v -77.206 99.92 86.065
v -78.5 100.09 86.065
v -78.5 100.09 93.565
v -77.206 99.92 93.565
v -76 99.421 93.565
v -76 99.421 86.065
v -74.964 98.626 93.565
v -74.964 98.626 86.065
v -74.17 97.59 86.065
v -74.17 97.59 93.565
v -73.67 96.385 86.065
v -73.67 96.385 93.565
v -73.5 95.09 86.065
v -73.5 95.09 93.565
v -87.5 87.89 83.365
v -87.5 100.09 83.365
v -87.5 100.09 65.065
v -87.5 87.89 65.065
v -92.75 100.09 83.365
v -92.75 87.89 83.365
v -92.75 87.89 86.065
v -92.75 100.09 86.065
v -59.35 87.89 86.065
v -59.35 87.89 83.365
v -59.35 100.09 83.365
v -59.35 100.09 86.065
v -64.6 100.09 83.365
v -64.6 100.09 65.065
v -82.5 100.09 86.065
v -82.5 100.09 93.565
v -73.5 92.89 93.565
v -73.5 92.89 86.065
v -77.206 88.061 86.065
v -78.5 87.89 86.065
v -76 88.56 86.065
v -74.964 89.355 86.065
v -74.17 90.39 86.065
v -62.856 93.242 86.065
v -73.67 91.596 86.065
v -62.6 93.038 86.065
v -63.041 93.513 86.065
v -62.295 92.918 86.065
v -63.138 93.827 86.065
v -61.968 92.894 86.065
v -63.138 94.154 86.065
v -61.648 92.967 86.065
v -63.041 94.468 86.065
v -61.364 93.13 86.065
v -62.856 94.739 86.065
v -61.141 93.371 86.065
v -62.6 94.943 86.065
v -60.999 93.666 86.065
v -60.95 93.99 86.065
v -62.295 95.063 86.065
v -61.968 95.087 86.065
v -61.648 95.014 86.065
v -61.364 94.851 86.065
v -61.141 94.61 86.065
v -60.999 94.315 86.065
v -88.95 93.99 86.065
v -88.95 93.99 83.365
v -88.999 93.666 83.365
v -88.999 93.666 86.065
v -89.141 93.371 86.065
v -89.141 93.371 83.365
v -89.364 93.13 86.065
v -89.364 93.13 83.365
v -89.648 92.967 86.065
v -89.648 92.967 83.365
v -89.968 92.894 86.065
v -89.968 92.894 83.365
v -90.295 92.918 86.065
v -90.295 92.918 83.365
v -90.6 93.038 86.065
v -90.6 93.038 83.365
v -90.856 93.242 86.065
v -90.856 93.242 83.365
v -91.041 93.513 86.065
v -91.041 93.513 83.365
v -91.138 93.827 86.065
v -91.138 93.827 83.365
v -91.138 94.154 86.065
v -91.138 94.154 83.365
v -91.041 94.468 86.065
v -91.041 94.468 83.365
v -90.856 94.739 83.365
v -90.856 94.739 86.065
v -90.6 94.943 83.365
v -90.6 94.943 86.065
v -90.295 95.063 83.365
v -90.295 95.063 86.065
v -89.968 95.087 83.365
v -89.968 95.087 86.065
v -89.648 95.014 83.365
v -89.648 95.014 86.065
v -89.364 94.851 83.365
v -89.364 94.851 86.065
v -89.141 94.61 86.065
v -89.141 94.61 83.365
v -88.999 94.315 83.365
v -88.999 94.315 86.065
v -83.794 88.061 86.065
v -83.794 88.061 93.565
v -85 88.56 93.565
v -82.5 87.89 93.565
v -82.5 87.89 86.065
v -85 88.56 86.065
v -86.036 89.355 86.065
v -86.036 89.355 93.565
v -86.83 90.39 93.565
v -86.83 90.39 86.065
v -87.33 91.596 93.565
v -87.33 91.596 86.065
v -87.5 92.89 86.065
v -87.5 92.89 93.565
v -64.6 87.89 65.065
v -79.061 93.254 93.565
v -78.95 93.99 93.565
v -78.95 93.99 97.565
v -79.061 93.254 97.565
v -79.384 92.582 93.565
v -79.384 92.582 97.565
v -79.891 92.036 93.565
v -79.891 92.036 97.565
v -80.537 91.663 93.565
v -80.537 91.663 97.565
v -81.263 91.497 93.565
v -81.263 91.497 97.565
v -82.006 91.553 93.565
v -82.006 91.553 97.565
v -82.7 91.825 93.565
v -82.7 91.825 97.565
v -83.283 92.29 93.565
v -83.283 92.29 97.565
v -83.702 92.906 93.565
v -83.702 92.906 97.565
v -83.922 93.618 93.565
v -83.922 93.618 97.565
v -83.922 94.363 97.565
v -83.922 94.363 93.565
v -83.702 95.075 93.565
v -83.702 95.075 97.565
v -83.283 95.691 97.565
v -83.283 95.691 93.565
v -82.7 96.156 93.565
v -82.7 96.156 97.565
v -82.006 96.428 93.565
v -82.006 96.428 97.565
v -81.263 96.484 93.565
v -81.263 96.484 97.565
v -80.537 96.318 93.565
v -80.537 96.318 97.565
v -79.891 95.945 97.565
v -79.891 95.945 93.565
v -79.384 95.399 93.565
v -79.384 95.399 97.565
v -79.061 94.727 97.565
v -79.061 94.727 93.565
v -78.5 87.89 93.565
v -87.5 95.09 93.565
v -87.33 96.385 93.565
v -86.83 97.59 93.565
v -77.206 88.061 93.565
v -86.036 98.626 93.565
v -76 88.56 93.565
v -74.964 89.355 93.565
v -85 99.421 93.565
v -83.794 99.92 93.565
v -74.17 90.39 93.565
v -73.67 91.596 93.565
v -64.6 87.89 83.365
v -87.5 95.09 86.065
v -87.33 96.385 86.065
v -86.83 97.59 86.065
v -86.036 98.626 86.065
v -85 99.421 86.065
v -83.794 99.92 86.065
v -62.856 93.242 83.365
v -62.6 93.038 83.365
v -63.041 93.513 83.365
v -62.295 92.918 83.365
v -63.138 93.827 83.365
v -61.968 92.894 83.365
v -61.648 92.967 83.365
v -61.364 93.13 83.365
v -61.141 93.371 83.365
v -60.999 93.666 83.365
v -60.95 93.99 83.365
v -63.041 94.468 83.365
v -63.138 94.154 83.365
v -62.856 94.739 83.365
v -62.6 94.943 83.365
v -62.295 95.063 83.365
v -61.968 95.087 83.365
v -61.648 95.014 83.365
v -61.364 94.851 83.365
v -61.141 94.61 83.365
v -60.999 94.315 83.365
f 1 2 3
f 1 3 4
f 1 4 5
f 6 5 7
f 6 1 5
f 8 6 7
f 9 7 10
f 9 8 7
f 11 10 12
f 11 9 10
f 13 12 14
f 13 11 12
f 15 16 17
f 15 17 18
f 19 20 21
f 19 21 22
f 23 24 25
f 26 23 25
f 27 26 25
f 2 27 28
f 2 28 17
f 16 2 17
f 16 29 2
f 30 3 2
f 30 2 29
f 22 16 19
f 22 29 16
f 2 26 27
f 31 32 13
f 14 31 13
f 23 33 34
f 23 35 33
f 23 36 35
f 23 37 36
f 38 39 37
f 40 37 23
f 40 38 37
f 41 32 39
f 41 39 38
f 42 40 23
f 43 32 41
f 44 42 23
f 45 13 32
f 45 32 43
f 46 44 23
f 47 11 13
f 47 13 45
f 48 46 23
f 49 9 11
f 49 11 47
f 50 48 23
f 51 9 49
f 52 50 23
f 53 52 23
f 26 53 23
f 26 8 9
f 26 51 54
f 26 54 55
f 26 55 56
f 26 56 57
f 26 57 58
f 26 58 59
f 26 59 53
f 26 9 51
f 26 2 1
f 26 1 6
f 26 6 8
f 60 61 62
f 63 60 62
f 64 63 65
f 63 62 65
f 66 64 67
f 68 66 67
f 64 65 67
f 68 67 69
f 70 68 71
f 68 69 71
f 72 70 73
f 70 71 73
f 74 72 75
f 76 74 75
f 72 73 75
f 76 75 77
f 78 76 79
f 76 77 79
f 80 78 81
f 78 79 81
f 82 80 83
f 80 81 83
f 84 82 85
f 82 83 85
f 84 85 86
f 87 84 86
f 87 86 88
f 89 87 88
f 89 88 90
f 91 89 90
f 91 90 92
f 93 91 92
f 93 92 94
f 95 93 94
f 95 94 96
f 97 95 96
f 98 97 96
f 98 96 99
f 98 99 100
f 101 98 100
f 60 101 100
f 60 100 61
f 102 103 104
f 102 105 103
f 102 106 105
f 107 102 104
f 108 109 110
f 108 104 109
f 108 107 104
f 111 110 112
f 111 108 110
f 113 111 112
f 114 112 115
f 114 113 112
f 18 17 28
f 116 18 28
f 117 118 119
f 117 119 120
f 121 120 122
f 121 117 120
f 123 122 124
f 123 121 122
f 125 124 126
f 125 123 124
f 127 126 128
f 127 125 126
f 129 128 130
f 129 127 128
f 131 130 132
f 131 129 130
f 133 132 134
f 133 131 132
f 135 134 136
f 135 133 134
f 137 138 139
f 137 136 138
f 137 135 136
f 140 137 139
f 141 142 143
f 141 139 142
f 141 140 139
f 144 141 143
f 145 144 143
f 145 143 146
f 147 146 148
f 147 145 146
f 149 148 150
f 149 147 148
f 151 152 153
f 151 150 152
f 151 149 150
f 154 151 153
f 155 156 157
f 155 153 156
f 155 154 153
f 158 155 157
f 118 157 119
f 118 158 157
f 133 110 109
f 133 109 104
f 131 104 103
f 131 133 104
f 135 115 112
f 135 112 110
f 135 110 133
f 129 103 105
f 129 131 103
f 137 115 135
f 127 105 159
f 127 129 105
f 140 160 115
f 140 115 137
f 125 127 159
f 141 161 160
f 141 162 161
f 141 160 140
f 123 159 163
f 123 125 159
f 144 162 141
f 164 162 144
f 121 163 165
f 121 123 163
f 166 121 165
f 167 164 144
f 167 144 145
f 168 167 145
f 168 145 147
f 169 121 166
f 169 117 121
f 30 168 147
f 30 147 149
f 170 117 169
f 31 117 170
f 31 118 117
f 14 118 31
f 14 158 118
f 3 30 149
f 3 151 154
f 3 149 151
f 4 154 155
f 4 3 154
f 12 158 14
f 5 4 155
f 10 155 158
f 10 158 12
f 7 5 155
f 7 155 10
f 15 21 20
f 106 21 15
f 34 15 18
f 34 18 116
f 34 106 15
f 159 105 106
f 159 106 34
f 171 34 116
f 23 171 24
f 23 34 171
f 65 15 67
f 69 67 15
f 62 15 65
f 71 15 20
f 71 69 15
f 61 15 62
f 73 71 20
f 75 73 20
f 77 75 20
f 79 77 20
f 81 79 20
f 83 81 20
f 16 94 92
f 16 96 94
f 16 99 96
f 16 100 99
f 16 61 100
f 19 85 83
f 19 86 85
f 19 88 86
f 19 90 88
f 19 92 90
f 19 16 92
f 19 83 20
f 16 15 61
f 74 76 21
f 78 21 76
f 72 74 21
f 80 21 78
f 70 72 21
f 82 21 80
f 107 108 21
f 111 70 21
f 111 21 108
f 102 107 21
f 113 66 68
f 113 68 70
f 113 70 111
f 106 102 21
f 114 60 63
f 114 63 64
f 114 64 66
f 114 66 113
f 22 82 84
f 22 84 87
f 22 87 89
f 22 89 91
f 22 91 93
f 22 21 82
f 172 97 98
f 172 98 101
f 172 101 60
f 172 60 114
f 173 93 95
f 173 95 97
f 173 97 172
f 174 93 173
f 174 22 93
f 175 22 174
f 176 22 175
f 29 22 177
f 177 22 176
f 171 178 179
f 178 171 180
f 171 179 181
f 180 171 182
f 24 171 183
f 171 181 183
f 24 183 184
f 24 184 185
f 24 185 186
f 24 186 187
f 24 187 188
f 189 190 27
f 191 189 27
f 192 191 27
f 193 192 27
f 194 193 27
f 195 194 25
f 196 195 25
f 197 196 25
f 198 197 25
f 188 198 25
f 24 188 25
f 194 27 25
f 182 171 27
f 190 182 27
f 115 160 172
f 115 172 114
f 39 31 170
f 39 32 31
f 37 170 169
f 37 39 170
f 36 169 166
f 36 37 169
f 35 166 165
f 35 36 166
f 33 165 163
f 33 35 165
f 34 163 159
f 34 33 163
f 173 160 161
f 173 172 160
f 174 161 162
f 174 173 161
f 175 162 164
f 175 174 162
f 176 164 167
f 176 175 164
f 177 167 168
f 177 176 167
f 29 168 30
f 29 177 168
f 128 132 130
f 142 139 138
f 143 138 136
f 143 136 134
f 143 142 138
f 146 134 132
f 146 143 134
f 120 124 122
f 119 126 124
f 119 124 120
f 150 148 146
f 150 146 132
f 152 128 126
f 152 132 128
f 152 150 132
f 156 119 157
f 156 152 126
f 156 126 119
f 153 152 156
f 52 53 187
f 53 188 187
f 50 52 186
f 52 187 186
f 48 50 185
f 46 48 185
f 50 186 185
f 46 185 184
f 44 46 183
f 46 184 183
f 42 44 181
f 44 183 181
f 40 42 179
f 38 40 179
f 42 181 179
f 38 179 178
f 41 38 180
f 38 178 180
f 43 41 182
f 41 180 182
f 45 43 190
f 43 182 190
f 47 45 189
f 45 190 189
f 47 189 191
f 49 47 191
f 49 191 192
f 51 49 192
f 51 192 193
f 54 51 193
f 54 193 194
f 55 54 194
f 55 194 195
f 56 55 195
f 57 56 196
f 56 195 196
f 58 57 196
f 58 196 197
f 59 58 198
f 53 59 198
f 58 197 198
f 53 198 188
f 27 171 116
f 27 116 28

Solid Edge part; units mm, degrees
sketch "Sketch1" plane through (0, 0, 86.0654) normal (0, 0, 1) x (1, 0, 0)
  line L0 (-64.6, 87.8905) -> (-64.6, 100.0905)
  line L1 (-64.6, 100.0905) -> (-87.5, 100.0905)
  line L2 (-87.5, 100.0905) -> (-87.5, 87.8905)
  line L3 (-87.5, 87.8905) -> (-64.6, 87.8905)
extrude "Protrusion1" add sketch "Sketch1" against normal blind 21
sketch "Sketch2" plane through (-76.05, 93.9905, 86.0654) normal (0, 0, 1) x (1, 0, 0)
  line L0 (2.55, -1.1) -> (2.55, 1.1)
  arc A0 (-2.45, 6.1) -> (2.55, 1.1) centre (-2.45, 1.1) cw
  line L1 (-2.45, 6.1) -> (-6.45, 6.1)
  arc A1 (-11.45, 1.1) -> (-6.45, 6.1) centre (-6.45, 1.1) cw
  line L2 (-11.45, 1.1) -> (-11.45, -1.1)
  arc A2 (-11.45, -1.1) -> (-6.45, -6.1) centre (-6.45, -1.1) ccw
  line L3 (-6.45, -6.1) -> (-2.45, -6.1)
  arc A3 (-2.45, -6.1) -> (2.55, -1.1) centre (-2.45, -1.1) ccw
extrude "ExtrudedProtrusion_5" add sketch "Sketch2" along normal blind 7.5
sketch "Sketch3" plane through (-80.5, 93.9905, 93.5654) normal (0, 0, 1) x (1, 0, 0)
  circle A0 centre (-0.95, 0) radius 2.5
extrude "ExtrudedProtrusion_6" add sketch "Sketch3" along normal blind 4
sketch "Sketch4" plane through (-76.05, 93.9905, 83.3654) normal (0, 0, -1) x (1, 0, 0)
  line L0 (-16.7, -6.1) -> (-11.45, -6.1)
  line L1 (-11.45, -6.1) -> (-11.45, 6.1)
  line L2 (-11.45, 6.1) -> (-16.7, 6.1)
  line L3 (-16.7, 6.1) -> (-16.7, -6.1)
  circle A0 centre (-14, 0) radius 1.1
  line L4 (11.45, -6.1) -> (11.45, 6.1)
  line L5 (11.45, 6.1) -> (16.7, 6.1)
  line L6 (16.7, 6.1) -> (16.7, -6.1)
  line L7 (16.7, -6.1) -> (11.45, -6.1)
  circle A1 centre (14, 0) radius 1.1
extrude "ExtrudedProtrusion_7" add sketch "Sketch4" against normal blind 2.7
